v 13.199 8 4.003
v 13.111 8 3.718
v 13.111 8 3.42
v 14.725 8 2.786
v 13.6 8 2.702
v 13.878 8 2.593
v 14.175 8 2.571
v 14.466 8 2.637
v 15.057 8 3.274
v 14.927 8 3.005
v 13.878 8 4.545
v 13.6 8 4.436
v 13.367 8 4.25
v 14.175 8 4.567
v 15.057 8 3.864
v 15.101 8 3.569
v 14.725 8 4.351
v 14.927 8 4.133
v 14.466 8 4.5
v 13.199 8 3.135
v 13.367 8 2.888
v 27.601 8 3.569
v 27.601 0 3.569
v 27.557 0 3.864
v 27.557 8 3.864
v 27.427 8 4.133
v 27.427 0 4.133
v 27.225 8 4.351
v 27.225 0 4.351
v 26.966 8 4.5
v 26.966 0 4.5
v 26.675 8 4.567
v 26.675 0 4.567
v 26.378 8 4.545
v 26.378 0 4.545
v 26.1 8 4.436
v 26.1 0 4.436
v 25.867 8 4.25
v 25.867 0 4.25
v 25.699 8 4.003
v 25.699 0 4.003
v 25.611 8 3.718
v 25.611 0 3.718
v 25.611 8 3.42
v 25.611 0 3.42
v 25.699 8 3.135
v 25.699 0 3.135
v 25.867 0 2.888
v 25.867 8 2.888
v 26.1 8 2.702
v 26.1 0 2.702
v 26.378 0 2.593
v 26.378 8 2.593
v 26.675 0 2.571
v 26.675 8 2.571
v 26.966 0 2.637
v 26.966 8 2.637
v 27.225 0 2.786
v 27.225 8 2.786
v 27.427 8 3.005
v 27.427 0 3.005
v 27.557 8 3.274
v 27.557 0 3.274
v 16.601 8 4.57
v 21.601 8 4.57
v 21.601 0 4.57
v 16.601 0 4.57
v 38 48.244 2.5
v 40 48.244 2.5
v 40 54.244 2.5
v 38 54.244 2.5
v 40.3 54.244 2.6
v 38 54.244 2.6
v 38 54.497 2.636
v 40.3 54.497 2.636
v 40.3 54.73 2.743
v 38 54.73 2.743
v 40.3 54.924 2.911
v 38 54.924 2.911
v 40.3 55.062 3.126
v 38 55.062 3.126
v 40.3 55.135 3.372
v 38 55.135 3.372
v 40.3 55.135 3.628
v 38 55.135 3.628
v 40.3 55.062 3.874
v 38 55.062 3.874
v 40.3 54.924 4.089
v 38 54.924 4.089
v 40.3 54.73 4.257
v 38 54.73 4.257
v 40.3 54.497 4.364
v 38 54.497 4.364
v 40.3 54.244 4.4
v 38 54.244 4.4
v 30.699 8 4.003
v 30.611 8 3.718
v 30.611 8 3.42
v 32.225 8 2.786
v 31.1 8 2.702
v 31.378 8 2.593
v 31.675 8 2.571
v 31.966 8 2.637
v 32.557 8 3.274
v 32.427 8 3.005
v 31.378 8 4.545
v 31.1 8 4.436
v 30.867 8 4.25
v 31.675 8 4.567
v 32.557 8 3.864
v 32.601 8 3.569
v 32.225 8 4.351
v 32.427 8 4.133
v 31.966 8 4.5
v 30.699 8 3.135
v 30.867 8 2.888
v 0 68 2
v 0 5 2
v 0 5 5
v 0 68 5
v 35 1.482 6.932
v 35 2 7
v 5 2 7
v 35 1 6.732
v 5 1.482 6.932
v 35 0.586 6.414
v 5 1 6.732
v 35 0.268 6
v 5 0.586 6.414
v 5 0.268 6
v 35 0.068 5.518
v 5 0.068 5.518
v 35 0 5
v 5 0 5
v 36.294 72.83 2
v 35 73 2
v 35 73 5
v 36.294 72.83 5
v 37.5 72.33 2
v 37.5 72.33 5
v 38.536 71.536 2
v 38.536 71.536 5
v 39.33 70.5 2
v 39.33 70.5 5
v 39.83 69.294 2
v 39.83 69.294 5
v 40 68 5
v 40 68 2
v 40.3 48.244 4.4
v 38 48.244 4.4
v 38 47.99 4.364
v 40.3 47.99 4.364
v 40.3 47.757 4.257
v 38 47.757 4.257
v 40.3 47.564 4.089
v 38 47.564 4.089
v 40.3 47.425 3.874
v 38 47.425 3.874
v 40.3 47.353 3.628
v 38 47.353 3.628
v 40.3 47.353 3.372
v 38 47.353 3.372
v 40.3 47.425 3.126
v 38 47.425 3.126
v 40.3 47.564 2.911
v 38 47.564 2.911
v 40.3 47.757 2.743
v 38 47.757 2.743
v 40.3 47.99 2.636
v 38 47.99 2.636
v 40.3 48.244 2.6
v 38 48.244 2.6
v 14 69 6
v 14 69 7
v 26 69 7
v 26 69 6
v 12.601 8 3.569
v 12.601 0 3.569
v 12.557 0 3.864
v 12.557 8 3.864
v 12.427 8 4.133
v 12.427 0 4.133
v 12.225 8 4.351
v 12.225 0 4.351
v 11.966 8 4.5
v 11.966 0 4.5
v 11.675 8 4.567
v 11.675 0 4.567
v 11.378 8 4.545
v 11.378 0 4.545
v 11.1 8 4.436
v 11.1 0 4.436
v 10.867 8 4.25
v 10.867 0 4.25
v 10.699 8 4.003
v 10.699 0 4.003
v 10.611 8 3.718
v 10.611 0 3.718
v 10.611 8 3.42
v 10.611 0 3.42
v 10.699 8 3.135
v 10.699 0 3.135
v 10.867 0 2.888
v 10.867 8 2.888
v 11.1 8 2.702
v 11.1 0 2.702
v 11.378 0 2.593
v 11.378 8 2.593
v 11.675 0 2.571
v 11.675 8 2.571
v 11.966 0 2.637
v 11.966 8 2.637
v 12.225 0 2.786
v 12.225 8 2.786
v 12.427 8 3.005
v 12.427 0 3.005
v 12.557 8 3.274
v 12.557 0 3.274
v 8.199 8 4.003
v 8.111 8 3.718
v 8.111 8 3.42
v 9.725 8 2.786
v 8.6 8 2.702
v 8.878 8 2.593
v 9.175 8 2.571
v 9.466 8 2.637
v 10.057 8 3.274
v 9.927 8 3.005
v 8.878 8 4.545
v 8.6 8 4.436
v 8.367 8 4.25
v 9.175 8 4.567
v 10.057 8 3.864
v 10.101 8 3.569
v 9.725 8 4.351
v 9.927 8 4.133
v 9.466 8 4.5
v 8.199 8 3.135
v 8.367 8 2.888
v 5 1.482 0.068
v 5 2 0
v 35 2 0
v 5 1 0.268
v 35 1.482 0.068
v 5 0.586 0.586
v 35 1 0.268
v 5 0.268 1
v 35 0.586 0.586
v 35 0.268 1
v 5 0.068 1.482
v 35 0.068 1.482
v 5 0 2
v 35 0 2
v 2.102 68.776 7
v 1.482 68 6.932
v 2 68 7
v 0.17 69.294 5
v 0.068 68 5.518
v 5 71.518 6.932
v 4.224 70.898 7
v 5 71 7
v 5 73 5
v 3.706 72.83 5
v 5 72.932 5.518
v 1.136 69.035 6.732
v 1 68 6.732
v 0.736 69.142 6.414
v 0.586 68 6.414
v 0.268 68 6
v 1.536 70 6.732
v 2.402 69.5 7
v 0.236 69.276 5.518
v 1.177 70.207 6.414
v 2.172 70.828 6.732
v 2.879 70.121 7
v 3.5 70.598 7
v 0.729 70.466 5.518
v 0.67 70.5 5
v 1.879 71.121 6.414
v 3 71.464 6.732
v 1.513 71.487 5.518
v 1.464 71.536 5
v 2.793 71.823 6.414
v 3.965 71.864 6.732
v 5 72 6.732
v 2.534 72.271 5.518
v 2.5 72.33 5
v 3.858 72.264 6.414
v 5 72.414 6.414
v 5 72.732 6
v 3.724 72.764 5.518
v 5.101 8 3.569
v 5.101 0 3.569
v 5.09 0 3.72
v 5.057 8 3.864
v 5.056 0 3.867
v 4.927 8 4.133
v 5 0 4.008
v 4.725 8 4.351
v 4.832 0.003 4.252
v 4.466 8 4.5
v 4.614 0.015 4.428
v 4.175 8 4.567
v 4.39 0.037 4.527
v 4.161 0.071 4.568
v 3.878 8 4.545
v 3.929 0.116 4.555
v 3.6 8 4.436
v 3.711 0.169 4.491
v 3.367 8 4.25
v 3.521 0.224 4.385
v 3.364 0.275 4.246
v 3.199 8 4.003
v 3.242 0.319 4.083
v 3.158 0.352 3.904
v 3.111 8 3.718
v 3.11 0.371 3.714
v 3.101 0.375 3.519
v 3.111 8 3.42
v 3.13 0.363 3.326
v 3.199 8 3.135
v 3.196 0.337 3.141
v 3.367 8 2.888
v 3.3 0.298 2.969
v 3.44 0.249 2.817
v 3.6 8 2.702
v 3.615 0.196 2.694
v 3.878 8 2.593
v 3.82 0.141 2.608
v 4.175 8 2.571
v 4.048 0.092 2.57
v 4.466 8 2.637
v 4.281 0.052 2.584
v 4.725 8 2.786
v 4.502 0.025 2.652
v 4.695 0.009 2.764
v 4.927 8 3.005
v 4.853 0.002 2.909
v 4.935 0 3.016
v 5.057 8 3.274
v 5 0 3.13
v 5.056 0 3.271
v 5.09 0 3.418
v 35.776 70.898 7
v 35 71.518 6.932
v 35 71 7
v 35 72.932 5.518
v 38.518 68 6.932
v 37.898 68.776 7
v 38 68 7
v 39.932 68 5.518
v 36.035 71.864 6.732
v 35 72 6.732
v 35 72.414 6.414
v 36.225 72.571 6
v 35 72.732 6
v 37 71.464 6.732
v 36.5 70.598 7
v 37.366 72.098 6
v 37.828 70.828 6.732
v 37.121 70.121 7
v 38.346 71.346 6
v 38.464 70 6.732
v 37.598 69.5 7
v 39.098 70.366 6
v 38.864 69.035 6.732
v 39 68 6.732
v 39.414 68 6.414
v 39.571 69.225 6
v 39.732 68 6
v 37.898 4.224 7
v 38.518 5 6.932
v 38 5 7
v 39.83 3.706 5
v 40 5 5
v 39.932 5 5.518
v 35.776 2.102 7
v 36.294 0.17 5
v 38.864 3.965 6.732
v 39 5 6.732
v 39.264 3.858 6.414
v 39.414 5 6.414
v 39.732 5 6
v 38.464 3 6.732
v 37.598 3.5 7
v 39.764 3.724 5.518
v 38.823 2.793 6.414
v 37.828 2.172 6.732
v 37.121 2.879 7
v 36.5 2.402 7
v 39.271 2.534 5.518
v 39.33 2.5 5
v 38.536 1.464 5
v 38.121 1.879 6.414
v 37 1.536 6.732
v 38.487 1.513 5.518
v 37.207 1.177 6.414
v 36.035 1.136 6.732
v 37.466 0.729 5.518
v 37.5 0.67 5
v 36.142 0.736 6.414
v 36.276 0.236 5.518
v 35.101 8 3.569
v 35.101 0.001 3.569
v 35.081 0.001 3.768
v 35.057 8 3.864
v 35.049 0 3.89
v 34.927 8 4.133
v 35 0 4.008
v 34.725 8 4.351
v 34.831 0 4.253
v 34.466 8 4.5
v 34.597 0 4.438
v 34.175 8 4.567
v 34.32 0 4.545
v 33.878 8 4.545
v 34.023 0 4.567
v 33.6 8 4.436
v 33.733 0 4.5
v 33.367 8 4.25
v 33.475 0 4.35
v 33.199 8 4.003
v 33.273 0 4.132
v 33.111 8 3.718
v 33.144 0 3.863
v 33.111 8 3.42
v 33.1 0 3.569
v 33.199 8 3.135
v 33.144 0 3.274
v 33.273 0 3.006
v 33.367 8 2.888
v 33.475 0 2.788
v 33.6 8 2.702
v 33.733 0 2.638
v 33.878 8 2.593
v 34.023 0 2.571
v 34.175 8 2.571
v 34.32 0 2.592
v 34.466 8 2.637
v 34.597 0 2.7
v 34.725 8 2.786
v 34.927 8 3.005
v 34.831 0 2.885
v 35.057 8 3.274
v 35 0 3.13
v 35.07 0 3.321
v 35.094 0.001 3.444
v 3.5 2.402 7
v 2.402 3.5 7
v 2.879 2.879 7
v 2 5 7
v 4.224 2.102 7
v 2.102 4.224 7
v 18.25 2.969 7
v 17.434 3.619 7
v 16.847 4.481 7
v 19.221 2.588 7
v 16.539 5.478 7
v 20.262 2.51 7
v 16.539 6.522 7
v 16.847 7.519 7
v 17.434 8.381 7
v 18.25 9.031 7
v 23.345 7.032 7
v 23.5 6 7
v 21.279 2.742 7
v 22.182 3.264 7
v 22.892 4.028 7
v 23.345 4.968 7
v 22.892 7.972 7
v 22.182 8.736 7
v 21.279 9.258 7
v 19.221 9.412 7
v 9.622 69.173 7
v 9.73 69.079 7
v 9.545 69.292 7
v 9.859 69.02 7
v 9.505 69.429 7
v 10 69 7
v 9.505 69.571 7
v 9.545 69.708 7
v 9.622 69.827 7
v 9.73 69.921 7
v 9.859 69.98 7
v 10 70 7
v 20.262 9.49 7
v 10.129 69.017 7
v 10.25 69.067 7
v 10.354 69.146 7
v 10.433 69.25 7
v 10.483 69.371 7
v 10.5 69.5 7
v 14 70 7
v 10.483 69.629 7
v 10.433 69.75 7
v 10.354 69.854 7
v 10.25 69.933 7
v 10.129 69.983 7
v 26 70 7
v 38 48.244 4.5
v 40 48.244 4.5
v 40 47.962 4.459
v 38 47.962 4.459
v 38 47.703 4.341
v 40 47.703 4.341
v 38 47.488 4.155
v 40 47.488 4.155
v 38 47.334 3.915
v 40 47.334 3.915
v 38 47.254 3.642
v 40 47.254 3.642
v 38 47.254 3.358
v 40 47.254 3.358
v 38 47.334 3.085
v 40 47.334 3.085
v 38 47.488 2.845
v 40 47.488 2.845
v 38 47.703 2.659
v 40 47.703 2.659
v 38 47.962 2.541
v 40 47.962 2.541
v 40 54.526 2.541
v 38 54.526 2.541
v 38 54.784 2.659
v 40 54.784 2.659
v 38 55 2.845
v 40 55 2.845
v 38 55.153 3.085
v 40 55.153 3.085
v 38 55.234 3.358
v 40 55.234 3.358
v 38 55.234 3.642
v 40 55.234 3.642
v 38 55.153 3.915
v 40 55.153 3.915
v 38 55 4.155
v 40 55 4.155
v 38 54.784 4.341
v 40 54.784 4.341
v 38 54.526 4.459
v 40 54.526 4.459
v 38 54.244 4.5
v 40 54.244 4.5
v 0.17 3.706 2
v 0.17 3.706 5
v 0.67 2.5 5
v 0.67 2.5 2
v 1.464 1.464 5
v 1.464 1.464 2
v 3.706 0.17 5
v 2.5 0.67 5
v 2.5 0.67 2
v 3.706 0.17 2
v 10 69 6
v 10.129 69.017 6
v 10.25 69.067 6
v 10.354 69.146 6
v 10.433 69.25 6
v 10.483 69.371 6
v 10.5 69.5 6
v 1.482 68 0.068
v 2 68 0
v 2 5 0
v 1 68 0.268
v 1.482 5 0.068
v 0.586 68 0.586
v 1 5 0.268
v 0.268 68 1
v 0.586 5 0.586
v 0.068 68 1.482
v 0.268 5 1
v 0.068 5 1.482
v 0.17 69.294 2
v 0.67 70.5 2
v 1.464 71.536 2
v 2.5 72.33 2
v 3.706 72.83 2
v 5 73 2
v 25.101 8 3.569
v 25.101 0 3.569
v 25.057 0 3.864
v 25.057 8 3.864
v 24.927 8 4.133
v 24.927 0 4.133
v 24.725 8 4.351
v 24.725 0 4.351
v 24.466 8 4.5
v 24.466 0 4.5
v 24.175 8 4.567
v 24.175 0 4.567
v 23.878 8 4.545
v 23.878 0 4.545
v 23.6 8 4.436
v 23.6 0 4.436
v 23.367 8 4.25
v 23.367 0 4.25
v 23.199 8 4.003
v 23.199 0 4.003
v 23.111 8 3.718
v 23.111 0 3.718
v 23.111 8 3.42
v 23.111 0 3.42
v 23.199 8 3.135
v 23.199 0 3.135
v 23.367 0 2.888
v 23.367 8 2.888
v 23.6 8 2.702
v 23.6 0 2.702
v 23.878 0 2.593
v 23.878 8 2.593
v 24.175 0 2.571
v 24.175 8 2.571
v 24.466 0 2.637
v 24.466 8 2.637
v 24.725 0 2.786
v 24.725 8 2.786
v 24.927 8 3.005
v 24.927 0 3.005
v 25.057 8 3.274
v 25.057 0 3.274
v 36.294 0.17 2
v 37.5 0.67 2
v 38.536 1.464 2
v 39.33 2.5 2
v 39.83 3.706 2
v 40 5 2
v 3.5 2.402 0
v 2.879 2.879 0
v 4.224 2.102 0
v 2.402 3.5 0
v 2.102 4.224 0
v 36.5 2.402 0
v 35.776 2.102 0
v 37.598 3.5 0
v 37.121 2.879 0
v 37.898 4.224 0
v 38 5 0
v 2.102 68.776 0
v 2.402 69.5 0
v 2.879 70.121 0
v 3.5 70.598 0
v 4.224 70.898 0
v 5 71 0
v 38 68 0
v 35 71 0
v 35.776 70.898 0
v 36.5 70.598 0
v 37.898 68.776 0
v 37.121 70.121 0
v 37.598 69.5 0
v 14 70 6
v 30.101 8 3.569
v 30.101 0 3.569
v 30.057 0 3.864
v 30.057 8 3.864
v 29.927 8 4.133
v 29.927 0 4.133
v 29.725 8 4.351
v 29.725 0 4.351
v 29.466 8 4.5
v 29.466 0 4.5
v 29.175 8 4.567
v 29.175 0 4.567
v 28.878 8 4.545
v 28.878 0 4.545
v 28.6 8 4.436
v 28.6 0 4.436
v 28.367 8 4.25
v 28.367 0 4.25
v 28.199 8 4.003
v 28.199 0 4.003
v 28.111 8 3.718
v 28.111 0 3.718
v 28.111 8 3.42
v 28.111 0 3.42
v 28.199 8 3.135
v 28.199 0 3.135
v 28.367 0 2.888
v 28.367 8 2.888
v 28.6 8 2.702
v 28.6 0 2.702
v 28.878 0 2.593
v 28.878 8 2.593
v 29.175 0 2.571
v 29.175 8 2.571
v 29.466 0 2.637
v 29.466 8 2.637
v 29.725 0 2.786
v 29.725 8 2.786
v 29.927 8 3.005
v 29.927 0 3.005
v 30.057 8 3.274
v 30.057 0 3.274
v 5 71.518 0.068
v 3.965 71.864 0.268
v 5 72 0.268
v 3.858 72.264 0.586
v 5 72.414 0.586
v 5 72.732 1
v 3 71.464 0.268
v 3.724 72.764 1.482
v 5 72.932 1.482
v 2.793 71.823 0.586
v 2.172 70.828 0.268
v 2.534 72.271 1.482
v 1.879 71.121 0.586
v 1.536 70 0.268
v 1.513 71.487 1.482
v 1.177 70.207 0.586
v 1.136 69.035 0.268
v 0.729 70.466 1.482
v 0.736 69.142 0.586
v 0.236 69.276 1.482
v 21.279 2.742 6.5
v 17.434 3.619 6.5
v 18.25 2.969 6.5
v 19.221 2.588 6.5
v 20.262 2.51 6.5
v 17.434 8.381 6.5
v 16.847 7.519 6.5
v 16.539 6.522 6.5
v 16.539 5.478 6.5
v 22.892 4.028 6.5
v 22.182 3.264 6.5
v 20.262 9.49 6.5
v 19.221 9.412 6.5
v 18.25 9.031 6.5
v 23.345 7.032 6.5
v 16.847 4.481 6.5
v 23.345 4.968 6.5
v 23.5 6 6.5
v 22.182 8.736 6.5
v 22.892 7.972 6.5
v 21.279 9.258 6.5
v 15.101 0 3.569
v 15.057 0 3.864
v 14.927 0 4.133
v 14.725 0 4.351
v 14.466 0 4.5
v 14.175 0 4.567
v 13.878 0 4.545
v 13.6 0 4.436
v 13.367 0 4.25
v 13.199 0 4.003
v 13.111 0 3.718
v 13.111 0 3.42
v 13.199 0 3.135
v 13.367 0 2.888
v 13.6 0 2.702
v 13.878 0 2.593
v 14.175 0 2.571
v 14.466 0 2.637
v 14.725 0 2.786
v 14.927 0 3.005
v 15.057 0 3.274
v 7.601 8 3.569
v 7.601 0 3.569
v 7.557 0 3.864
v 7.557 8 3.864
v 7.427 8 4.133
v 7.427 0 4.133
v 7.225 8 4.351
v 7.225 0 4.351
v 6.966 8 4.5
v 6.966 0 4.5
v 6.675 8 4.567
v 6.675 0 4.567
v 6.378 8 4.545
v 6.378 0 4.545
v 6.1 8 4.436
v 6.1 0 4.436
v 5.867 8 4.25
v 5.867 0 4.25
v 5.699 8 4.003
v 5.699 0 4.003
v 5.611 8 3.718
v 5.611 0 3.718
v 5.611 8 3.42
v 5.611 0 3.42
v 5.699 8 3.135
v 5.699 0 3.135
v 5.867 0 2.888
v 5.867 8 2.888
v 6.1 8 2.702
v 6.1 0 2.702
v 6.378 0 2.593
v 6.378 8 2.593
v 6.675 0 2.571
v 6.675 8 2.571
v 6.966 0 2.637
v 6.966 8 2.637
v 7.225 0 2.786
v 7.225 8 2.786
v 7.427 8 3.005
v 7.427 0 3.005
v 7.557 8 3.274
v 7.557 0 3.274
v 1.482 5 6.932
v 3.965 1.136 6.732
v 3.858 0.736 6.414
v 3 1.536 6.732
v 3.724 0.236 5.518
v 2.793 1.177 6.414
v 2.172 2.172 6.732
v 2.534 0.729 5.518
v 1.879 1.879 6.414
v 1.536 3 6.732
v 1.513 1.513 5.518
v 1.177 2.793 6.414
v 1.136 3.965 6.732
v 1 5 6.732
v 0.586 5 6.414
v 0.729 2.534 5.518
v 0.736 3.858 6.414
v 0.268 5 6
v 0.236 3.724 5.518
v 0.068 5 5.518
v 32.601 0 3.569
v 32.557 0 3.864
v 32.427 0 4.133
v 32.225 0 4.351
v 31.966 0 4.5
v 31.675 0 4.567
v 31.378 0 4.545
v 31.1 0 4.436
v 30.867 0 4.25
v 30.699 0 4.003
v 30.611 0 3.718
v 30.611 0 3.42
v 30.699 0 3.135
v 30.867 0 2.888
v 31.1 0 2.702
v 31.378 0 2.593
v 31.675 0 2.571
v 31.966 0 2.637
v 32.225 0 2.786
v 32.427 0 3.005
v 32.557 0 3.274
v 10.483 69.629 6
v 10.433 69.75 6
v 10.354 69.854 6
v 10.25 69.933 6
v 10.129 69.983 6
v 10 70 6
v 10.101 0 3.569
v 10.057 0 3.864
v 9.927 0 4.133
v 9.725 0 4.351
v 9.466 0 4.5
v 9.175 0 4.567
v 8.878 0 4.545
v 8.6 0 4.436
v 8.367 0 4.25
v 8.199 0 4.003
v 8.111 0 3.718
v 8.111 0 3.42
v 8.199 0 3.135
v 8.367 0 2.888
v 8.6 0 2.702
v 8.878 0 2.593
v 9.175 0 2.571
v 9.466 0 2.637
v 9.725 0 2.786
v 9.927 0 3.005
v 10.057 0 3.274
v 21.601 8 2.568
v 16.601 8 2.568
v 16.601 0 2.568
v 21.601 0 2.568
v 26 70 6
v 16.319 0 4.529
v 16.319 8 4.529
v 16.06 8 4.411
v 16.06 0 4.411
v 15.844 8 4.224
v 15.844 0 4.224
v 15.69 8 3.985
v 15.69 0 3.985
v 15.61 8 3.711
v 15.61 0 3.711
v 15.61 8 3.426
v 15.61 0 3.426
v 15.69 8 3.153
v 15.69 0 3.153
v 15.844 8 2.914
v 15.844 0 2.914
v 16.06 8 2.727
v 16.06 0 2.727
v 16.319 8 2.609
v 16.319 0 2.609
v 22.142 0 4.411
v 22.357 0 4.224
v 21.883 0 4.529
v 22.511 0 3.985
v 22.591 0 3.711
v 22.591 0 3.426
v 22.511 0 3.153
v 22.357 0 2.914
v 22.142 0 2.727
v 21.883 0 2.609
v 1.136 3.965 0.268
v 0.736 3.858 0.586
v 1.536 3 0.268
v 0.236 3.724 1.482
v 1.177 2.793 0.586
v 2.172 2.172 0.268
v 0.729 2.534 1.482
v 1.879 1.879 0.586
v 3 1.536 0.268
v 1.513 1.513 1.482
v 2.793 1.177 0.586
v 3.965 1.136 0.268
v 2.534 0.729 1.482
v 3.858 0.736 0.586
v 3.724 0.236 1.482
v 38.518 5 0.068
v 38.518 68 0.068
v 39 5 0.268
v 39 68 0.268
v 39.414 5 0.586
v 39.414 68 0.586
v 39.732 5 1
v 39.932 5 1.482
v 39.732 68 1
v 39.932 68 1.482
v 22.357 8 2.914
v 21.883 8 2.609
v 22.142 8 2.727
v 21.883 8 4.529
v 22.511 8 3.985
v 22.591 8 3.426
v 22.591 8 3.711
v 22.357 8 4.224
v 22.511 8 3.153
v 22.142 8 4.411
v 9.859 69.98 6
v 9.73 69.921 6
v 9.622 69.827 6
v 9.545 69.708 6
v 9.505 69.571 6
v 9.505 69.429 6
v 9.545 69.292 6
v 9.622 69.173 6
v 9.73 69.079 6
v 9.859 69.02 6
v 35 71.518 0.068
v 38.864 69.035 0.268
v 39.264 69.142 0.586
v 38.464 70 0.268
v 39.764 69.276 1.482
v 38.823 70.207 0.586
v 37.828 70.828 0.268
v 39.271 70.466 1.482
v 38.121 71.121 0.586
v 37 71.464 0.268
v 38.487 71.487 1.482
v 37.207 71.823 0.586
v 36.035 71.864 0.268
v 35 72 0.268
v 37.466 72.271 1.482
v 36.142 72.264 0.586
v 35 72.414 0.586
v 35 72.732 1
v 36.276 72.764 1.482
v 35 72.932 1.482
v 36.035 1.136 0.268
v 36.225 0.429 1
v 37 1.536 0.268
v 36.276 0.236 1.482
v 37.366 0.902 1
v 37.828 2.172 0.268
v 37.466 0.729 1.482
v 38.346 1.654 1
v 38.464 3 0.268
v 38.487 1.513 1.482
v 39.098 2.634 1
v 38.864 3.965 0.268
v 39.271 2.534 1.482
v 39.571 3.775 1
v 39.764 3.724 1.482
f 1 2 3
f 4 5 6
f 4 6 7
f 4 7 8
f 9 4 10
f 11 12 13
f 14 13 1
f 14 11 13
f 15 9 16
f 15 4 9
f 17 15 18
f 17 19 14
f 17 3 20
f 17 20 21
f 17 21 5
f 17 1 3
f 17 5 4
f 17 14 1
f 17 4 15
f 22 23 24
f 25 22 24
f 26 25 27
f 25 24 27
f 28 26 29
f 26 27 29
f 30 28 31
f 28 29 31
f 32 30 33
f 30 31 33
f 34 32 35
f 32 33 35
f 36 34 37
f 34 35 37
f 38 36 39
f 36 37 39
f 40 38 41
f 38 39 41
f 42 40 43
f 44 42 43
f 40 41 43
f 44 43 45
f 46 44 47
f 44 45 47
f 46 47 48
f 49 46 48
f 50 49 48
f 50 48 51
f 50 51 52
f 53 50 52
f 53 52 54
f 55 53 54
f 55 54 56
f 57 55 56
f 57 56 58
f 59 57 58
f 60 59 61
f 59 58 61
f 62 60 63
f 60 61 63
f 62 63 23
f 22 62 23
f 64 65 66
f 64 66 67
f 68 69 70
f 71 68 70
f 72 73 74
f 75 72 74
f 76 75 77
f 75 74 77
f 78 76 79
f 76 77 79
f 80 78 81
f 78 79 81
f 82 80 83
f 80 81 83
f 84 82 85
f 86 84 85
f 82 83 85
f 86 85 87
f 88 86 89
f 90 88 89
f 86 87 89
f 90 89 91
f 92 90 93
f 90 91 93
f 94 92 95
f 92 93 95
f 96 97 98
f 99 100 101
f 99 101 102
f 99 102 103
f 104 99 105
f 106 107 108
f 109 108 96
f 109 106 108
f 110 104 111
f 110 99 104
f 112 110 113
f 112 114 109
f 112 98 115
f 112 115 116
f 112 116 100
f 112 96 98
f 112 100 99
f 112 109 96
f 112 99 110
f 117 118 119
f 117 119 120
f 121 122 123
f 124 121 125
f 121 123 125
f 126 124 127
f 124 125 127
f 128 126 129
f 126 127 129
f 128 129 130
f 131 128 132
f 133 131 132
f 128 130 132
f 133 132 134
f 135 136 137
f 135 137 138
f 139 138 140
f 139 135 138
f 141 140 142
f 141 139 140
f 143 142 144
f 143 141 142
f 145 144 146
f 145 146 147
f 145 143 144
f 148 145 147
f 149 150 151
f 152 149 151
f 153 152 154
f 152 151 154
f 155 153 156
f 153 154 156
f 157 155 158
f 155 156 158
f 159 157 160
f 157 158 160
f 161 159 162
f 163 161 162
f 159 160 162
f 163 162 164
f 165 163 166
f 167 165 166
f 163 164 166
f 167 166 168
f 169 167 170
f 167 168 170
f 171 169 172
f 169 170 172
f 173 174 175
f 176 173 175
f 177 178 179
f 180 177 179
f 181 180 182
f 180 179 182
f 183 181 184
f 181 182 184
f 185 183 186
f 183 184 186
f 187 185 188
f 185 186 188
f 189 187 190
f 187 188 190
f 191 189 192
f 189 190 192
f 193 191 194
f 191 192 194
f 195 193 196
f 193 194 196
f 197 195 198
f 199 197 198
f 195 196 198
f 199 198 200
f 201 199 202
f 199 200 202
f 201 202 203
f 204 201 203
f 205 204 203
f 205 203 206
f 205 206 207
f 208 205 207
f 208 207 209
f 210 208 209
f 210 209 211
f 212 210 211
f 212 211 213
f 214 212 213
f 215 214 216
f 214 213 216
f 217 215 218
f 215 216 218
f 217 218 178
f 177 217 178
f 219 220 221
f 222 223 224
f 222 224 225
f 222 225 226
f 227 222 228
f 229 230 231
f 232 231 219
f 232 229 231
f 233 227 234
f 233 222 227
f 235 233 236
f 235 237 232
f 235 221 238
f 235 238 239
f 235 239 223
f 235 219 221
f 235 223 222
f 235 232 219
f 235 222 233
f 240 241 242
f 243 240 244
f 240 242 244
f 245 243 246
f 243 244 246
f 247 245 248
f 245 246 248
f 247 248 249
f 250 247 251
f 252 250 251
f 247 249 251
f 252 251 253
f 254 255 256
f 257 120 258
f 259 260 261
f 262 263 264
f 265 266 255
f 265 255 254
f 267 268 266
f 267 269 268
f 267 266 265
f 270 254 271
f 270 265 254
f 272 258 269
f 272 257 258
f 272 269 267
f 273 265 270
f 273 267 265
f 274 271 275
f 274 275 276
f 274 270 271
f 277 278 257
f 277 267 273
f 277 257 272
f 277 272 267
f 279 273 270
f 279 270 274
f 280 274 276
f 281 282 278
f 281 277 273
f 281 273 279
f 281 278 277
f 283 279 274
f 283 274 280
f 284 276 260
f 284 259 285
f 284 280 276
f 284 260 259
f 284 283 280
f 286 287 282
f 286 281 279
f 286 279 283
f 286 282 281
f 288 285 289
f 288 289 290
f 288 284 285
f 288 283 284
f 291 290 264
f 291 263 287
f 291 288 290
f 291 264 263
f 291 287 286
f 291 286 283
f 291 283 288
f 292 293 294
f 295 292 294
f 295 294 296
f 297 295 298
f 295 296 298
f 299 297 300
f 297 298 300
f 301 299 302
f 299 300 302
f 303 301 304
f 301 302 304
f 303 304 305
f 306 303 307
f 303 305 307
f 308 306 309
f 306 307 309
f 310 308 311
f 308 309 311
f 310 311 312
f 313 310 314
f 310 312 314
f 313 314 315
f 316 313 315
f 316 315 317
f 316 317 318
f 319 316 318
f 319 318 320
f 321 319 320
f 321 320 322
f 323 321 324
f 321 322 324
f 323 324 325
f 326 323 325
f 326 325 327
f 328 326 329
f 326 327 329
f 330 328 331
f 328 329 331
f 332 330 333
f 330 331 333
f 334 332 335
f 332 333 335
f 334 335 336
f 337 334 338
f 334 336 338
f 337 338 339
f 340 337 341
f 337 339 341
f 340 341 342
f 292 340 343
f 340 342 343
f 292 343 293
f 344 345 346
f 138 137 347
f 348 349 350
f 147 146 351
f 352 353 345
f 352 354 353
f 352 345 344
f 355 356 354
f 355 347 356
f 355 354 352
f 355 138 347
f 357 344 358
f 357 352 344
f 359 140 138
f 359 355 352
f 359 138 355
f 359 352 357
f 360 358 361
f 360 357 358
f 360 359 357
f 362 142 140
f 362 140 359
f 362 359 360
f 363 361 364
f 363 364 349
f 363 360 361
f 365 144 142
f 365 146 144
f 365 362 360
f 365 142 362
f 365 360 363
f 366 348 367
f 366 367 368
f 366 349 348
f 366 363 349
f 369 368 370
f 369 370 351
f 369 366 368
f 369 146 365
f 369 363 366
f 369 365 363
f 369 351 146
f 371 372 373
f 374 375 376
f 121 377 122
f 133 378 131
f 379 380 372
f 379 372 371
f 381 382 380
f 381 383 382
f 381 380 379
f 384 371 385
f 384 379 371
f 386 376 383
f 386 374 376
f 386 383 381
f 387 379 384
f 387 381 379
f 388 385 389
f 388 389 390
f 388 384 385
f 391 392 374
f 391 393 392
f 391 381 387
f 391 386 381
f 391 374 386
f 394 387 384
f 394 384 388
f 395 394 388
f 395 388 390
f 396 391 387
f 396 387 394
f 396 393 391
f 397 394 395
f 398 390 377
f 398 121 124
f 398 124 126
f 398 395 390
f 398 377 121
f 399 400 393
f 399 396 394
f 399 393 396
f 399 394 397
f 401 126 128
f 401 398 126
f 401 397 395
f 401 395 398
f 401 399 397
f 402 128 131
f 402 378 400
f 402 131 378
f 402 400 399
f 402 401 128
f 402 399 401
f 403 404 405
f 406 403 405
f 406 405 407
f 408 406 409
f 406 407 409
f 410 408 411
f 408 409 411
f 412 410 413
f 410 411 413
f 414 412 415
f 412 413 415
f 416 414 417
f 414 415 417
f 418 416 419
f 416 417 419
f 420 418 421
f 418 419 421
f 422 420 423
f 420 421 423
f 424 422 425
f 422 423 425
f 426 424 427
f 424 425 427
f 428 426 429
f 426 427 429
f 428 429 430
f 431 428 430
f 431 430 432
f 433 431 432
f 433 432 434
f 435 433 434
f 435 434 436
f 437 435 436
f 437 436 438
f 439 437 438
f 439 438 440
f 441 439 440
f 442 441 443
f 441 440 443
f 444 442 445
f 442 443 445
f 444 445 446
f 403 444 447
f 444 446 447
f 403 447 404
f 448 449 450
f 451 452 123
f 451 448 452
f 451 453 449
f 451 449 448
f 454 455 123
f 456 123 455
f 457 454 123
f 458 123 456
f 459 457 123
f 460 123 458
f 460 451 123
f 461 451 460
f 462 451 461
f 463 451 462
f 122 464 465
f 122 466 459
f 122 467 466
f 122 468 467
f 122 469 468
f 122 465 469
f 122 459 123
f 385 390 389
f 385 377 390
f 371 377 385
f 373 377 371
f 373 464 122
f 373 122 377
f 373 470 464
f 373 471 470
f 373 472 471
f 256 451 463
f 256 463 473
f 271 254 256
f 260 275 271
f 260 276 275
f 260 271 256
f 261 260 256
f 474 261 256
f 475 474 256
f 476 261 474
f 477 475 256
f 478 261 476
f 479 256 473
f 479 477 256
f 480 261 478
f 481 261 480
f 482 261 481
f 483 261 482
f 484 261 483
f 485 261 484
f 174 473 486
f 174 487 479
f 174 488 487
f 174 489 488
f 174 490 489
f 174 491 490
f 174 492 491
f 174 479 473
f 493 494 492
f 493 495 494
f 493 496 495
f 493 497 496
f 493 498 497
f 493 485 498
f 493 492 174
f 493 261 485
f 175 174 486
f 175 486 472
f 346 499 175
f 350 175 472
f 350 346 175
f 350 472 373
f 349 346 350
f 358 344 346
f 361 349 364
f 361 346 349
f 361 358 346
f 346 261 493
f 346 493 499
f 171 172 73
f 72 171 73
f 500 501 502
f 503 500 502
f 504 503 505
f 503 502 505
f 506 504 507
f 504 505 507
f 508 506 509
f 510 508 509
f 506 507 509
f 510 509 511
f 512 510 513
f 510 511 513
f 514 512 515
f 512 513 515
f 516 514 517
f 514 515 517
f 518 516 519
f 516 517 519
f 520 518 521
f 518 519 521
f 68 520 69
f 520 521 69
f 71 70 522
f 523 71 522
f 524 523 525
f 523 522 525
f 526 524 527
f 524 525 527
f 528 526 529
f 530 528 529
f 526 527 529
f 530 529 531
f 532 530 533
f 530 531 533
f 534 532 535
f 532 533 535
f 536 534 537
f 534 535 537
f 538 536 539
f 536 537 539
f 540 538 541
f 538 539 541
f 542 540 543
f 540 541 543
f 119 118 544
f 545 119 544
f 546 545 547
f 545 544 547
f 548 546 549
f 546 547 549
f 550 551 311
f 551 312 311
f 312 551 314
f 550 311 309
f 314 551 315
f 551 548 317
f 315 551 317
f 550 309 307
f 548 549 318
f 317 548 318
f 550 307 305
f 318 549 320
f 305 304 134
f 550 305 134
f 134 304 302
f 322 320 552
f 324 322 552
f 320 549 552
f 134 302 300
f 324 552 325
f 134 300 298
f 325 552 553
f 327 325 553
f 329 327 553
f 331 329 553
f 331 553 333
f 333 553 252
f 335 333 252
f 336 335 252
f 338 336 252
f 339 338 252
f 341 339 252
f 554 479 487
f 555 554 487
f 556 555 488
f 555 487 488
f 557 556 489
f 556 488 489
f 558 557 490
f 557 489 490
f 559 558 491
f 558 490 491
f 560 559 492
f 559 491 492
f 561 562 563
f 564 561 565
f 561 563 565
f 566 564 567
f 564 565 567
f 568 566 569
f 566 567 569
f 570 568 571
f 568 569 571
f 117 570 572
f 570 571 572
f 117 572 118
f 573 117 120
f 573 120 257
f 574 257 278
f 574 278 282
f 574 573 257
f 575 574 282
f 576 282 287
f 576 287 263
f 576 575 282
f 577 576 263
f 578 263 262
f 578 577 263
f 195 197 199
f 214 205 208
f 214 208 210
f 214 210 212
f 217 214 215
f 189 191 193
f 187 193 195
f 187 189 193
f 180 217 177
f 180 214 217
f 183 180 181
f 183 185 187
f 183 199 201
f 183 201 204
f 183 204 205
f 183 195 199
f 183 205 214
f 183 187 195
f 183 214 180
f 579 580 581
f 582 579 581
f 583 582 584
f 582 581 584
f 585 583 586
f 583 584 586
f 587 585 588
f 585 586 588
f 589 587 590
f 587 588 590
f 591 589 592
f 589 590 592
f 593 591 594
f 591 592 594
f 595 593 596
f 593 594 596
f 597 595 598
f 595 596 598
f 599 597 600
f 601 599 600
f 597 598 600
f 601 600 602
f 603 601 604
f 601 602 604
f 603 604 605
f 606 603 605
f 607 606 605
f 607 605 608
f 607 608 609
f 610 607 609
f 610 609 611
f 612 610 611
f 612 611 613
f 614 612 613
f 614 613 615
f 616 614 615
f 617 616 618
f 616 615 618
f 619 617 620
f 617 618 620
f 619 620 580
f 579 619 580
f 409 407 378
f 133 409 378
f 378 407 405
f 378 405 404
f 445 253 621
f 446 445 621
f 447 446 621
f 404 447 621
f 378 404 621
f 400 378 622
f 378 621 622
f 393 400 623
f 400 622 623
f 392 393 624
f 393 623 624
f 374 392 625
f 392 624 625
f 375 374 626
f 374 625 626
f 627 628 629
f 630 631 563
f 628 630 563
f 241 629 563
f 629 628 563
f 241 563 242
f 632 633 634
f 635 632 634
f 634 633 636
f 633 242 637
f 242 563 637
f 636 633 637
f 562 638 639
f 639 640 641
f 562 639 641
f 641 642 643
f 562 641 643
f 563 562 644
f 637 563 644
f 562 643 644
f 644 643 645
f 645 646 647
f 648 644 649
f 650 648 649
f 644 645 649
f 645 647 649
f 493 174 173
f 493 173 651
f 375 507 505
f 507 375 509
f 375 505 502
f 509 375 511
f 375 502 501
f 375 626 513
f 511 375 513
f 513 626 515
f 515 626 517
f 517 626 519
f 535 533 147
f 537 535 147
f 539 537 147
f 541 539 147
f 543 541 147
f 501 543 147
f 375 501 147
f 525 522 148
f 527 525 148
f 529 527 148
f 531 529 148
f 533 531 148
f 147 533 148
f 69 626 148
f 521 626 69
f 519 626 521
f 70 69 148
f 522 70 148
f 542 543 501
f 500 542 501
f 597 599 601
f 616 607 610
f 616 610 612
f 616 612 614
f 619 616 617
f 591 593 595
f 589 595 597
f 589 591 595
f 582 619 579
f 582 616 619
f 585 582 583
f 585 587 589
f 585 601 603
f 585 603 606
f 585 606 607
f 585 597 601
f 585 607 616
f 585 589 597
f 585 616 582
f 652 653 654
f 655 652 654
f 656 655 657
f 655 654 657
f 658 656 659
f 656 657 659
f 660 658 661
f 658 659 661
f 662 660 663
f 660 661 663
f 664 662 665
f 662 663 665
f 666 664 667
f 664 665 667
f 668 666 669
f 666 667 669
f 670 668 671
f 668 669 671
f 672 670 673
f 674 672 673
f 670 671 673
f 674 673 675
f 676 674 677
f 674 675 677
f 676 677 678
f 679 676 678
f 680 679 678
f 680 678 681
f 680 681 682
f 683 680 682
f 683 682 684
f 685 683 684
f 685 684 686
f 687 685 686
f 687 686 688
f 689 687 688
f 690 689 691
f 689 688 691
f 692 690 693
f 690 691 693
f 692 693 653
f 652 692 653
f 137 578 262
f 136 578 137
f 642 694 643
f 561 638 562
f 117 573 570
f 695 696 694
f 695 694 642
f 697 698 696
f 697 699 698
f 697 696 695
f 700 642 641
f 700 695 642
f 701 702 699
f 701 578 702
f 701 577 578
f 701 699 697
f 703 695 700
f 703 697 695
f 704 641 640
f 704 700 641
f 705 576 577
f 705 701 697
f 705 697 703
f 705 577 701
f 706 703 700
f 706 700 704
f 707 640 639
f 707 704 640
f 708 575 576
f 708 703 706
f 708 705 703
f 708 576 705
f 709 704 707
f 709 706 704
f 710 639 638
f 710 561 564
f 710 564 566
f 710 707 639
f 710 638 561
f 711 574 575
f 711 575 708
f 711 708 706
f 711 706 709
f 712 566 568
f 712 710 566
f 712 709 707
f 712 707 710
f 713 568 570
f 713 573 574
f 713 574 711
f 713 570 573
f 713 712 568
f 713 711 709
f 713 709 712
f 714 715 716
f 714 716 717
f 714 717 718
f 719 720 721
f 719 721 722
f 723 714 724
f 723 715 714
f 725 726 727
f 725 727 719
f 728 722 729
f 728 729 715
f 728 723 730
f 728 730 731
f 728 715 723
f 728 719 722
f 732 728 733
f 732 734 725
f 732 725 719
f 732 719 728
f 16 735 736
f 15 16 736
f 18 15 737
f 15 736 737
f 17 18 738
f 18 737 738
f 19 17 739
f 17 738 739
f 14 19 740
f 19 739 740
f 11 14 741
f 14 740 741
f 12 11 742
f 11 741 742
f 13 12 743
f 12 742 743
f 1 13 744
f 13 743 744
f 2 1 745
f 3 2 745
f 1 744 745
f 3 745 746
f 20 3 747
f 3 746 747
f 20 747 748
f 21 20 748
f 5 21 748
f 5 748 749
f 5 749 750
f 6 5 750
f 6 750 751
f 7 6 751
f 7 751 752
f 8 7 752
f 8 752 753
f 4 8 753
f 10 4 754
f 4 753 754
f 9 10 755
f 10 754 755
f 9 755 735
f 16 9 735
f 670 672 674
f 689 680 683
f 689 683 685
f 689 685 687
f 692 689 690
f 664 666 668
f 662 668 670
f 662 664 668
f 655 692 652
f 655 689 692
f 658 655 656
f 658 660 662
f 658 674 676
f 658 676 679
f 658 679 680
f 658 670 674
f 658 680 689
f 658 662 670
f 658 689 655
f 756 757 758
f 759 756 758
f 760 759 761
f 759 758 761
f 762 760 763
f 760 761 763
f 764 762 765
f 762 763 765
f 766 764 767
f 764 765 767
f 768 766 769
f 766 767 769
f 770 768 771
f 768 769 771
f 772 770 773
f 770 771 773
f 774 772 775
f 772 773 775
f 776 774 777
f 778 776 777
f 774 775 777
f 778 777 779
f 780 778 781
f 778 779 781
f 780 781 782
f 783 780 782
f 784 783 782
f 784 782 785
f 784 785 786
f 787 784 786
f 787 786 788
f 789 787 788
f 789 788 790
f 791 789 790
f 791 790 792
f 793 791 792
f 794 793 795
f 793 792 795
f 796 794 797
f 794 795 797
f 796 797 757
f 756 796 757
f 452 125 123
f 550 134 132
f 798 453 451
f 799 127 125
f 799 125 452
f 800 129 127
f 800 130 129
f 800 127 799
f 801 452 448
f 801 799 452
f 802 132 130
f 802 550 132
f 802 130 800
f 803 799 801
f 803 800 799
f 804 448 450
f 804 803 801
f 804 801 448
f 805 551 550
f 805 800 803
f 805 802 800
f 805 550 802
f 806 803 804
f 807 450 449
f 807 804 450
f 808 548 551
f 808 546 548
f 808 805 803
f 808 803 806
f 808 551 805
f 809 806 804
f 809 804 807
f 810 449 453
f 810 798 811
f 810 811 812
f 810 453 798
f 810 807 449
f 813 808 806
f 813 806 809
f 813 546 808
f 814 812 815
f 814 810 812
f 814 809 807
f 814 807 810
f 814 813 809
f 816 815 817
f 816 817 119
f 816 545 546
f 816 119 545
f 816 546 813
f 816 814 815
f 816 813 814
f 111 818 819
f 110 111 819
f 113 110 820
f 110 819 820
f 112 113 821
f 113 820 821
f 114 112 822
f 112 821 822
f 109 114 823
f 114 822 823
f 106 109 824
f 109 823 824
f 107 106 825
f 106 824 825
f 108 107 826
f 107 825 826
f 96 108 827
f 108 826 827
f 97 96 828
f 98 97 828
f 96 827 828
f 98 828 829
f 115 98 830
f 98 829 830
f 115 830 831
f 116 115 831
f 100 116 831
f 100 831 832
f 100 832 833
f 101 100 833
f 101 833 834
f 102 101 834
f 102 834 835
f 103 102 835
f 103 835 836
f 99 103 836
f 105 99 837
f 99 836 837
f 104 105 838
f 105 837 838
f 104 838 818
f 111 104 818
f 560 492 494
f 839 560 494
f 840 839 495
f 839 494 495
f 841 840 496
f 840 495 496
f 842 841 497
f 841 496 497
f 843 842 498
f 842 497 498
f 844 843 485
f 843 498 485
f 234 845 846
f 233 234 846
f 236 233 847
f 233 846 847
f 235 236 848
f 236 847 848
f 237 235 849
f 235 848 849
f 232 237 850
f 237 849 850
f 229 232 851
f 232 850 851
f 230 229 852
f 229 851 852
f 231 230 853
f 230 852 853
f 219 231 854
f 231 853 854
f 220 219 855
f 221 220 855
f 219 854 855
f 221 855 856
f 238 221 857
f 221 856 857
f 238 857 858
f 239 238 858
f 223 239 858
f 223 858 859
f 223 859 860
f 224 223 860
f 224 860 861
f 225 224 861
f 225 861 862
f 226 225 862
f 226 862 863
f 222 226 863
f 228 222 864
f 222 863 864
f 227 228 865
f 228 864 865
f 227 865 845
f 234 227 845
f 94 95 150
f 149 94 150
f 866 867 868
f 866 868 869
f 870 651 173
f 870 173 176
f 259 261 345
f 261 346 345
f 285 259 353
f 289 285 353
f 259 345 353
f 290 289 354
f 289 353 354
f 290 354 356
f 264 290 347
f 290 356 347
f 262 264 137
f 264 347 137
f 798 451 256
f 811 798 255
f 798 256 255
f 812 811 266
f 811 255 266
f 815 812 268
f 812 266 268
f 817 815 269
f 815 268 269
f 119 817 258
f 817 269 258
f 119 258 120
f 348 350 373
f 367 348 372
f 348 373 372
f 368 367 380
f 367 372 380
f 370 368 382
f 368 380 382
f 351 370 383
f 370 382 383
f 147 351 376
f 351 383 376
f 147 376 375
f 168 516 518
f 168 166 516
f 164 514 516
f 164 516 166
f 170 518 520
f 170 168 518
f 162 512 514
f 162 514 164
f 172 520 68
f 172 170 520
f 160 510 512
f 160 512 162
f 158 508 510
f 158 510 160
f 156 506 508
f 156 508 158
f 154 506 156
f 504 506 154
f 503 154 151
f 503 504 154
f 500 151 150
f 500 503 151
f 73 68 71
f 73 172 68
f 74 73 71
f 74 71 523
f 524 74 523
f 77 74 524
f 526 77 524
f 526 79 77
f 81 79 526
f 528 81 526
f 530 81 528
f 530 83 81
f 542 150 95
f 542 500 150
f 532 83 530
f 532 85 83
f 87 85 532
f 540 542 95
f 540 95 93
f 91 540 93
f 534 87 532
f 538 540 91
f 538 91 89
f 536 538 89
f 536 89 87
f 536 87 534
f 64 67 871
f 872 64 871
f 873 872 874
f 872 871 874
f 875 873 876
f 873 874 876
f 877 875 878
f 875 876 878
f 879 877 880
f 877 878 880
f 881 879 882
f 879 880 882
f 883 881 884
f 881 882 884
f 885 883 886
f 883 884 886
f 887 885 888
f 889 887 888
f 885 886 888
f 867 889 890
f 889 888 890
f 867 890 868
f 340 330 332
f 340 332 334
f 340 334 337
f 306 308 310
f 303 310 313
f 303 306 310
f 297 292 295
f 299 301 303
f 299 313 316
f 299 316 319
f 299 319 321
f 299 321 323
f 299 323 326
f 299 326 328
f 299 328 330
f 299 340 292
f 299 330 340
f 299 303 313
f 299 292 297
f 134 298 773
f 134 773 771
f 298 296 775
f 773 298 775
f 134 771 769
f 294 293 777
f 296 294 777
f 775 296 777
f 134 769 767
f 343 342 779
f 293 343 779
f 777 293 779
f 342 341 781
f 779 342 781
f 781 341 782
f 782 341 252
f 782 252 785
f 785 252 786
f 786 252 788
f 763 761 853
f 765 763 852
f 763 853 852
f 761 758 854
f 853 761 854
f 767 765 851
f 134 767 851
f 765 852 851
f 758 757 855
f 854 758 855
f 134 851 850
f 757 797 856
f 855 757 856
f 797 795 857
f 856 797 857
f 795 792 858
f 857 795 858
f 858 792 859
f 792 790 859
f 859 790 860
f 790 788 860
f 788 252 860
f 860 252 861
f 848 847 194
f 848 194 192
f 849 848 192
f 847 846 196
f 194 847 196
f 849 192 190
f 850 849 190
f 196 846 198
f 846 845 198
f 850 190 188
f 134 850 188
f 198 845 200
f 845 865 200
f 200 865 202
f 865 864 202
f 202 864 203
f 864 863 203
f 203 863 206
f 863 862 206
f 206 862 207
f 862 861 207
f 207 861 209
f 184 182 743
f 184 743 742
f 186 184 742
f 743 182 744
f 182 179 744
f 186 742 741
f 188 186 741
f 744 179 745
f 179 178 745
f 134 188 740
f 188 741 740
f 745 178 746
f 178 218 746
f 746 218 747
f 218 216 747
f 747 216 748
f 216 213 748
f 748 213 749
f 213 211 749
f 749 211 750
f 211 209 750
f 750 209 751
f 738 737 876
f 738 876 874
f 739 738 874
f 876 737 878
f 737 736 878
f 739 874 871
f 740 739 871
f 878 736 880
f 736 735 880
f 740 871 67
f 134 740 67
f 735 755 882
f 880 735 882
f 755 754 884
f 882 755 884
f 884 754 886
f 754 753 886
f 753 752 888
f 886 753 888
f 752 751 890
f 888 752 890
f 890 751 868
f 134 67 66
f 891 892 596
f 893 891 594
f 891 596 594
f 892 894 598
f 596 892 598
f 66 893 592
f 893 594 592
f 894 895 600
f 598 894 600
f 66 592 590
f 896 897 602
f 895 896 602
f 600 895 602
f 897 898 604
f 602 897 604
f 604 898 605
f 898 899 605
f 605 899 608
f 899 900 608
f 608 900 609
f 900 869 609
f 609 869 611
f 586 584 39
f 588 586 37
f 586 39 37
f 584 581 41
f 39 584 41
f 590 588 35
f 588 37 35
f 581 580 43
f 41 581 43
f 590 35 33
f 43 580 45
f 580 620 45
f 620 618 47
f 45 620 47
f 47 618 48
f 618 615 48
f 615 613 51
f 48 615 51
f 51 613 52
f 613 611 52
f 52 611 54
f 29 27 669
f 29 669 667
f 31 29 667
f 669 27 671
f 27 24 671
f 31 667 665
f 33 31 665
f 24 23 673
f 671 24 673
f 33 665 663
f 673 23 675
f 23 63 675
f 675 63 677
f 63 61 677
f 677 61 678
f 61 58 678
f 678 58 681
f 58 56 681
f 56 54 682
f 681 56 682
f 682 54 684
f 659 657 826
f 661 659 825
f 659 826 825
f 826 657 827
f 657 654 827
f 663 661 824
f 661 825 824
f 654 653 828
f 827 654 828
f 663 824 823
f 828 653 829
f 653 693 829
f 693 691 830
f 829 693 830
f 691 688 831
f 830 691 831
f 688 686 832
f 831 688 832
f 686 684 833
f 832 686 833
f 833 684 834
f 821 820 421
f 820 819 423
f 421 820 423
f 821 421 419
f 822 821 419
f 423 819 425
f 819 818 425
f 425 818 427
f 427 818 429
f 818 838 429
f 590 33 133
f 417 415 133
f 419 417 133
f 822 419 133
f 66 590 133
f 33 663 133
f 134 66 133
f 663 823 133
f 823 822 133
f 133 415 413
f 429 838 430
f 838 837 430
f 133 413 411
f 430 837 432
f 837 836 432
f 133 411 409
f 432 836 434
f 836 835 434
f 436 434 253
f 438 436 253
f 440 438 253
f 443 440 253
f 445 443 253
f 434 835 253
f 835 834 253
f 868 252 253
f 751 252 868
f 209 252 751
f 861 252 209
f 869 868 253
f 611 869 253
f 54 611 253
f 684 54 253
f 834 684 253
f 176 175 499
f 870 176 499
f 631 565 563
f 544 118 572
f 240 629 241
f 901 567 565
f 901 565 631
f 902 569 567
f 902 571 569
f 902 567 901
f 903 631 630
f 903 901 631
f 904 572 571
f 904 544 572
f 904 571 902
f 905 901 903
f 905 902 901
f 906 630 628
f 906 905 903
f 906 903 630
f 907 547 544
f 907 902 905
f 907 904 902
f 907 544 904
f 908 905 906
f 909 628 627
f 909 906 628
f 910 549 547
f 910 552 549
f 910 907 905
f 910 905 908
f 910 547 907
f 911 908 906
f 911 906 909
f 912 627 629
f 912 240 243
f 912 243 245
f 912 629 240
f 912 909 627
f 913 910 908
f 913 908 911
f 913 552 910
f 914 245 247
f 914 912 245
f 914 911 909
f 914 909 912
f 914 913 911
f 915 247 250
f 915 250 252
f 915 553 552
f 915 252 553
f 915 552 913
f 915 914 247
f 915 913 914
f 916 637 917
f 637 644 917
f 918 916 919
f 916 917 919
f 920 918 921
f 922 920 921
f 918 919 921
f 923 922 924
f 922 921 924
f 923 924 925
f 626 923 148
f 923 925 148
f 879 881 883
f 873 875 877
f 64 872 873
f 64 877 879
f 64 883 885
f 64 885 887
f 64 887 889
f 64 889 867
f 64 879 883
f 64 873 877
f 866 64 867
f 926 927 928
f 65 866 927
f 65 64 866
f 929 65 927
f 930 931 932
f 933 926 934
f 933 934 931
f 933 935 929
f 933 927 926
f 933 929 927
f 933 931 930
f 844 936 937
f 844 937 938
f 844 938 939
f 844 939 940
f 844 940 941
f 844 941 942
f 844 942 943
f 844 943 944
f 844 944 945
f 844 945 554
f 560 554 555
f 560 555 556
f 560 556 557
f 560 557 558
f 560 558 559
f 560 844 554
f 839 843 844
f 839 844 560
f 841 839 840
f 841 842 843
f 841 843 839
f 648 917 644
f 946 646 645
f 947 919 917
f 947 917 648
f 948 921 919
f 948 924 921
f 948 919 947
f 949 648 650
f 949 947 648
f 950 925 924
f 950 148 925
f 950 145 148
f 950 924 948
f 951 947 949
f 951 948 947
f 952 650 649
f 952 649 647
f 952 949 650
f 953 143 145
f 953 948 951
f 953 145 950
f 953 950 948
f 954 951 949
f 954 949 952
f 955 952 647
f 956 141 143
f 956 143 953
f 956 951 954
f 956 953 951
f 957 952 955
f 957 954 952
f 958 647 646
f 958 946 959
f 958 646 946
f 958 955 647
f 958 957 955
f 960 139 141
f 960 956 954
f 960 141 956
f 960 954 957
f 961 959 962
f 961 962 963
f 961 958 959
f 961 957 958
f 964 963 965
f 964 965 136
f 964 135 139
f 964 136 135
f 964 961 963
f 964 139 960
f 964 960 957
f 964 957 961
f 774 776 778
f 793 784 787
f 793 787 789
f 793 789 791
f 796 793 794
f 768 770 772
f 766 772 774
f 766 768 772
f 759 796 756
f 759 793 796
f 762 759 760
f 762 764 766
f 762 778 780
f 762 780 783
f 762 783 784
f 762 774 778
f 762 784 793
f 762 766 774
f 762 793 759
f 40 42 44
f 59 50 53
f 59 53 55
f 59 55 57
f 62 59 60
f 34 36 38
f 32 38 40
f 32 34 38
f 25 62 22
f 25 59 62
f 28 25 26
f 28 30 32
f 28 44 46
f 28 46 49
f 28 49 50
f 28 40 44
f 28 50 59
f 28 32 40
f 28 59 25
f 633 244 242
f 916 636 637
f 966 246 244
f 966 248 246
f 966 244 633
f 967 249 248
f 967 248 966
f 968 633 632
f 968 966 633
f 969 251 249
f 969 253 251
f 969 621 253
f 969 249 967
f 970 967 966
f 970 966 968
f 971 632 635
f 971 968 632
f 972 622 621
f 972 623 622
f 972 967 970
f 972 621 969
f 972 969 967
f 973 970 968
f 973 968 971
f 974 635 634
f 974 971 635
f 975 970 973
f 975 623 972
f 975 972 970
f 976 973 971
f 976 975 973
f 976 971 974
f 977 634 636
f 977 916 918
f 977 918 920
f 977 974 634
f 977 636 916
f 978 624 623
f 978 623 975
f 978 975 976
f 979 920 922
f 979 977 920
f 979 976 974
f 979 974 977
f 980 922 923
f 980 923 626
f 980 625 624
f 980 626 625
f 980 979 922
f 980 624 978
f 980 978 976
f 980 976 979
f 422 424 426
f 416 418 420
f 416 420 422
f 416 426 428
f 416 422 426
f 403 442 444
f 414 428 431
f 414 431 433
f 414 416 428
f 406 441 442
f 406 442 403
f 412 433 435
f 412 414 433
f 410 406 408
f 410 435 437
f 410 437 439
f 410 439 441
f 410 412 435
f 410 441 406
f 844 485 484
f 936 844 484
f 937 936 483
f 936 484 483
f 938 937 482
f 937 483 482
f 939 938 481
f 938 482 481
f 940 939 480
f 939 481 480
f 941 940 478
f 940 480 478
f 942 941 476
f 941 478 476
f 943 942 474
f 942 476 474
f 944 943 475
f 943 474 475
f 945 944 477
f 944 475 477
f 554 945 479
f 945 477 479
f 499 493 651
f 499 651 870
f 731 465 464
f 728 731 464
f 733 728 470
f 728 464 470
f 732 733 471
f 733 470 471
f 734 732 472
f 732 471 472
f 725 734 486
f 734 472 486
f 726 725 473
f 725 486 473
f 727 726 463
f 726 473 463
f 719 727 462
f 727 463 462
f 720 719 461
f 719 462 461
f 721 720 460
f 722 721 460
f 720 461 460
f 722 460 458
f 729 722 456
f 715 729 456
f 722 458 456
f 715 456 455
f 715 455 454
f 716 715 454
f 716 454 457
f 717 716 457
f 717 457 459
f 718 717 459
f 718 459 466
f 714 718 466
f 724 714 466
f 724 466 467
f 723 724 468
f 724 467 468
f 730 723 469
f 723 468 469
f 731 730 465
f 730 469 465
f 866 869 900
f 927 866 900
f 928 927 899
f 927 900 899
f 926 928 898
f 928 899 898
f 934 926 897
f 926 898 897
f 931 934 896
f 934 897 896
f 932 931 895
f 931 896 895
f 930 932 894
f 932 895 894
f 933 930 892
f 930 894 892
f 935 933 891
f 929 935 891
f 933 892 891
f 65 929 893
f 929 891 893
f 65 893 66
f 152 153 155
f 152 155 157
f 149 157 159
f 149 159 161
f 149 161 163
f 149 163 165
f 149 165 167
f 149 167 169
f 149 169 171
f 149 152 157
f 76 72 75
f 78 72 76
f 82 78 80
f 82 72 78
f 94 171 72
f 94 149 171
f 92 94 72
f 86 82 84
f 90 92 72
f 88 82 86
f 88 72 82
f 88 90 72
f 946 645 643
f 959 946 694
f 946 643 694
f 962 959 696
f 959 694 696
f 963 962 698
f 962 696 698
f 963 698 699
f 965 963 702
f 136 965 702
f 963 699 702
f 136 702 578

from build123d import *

# Parameters (mm, degrees)
F0_W         = 40
F0_H         = 73
F1_DEPTH     = 7
F3_R         = 1.0007571232
F4_DEPTH     = 8
F6_DEPTH     = 2
F8_DEPTH     = 2.3
F9_R         = 3.5
F10_DEPTH    = 0.5
F11_W        = 12
F11_H        = 1
F12_DEPTH    = 1
F13_T1_DEPTH = 32
F14_R        = 2
F15_R        = 2


# Not quite as in the source:
# - a fillet or chamfer that OpenCascade refuses, or shapes differently, is made with other operations: its cross-section is extruded or revolved along the edge and cut away or added


with BuildPart() as f1:
    # F0 (on Top) → F1 (new body)
    with BuildSketch(Plane.XY):
        with Locations((20, 36.5)):
            Rectangle(F0_W, F0_H)
    extrude(amount=F1_DEPTH)

    # F3 (on face) → F4 (cut)
    with BuildSketch(Plane.XZ):
        with Locations((4.10061609, 3.5689128563)):
            Circle(F3_R)
        with Locations((6.60061609, 3.5689128563)):
            Circle(F3_R)
        with Locations((9.10061609, 3.5689128563)):
            Circle(F3_R)
        with Locations((11.60061609, 3.5689128563)):
            Circle(F3_R)
        with Locations((14.10061609, 3.5689128563)):
            Circle(F3_R)
        with BuildLine():
            Line((21.60061609, 4.5696699795), (16.60061609, 4.5696699795))
            ThreePointArc((16.60061609, 4.5696699795), (15.5998589668, 3.5689128563), (16.60061609, 2.568155733))
            Line((16.60061609, 2.568155733), (21.60061609, 2.568155733))
            ThreePointArc((21.60061609, 2.568155733), (22.6013732132, 3.5689128563), (21.60061609, 4.5696699795))
        make_face()
        with Locations((24.10061609, 3.5689128563)):
            Circle(F3_R)
        with Locations((26.60061609, 3.5689128563)):
            Circle(F3_R)
        with Locations((29.10061609, 3.5689128563)):
            Circle(F3_R)
        with Locations((31.60061609, 3.5689128563)):
            Circle(F3_R)
        with Locations((34.10061609, 3.5689128563)):
            Circle(F3_R)
    extrude(amount=-F4_DEPTH, mode=Mode.SUBTRACT)

    # F5 (on face) → F6 (cut)
    with BuildSketch(Plane.YZ.offset(40)):
        with BuildLine():
            Line((54.2437834144, 4.5), (48.2437834144, 4.5))
            ThreePointArc((48.2437834144, 4.5), (47.2437834144, 3.5), (48.2437834144, 2.5))
            Line((48.2437834144, 2.5), (54.2437834144, 2.5))
            ThreePointArc((54.2437834144, 2.5), (55.2437834144, 3.5), (54.2437834144, 4.5))
        make_face()
    extrude(amount=-F6_DEPTH, mode=Mode.SUBTRACT)

    # F7 (on face) → F8 (join)
    with BuildSketch(Plane.YZ.offset(38)):
        with BuildLine():
            Line((54.2437834144, 4.4), (48.2437834144, 4.4))
            ThreePointArc((48.2437834144, 4.4), (47.3437834144, 3.5), (48.2437834144, 2.6))
            Line((48.2437834144, 2.6), (54.2437834144, 2.6))
            ThreePointArc((54.2437834144, 2.6), (55.1437834144, 3.5), (54.2437834144, 4.4))
        make_face()
    extrude(amount=F8_DEPTH)

    # F9 (on face) → F10 (cut)
    with BuildSketch(Plane.XY.offset(7)):
        with Locations((20, 6)):
            Circle(F9_R)
    extrude(amount=-F10_DEPTH, mode=Mode.SUBTRACT)

    # F11 (on face) → F12 (cut)
    with BuildSketch(Plane.XY.offset(7)):
        with Locations((20, 69.5)):
            Rectangle(F11_W, F11_H)
        with BuildLine():
            ThreePointArc((10.5, 69.5), (10.3535533906, 69.8535533906), (10, 70))
            Line((10, 70), (10, 69))
            ThreePointArc((10, 69), (10.3535533906, 69.1464466094), (10.5, 69.5))
        make_face()
        with BuildLine():
            Line((10, 69), (10, 70))
            ThreePointArc((10, 70), (9.5, 69.5), (10, 69))
        make_face()
    extrude(amount=-F12_DEPTH, mode=Mode.SUBTRACT)

    # F13: fillet of radius 5 on 4 edges, made by hand

    # F13_s2 → F13_t1 (cut)
    with BuildSketch(Plane.XY.offset(-12.5)):
        with BuildLine():
            ThreePointArc((35, 0), (38.5355339059, 1.4644660941), (40, 5))
            Line((40, 5), (40, 0))
            Line((40, 0), (35, 0))
        make_face()
        with BuildLine():
            ThreePointArc((0, 5), (1.4644660941, 1.4644660941), (5, 0))
            Line((5, 0), (0, 0))
            Line((0, 0), (0, 5))
        make_face()
        with BuildLine():
            ThreePointArc((35, 73), (38.5355339059, 71.5355339059), (40, 68))
            Line((40, 68), (40, 73))
            Line((40, 73), (35, 73))
        make_face()
        with BuildLine():
            ThreePointArc((0, 68), (1.4644660941, 71.5355339059), (5, 73))
            Line((5, 73), (0, 73))
            Line((0, 73), (0, 68))
        make_face()
    extrude(amount=F13_T1_DEPTH, mode=Mode.SUBTRACT)

    # F14
    f14_edges = [f1.edges().sort_by_distance(p)[0] for p in [
        (38.535534, 71.535534, 7),
        (20, 73, 7),
        (1.464466, 71.535534, 7),
        (0, 36.5, 7),
        (1.464466, 1.464466, 7),
        (20, 0, 7),
        (38.535534, 1.464466, 7),
        (40, 36.5, 7),
    ]]
    fillet(f14_edges, radius=F14_R)

    # F15
    f15_edges = [f1.edges().sort_by_distance(p)[0] for p in [
        (40, 36.5, 0),
        (38.535534, 71.535534, 0),
        (20, 73, 0),
        (1.464466, 71.535534, 0),
        (0, 36.5, 0),
        (38.535534, 1.464466, 0),
        (20, 0, 0),
        (1.464466, 1.464466, 0),
    ]]
    fillet(f15_edges, radius=F15_R)


solid = f1.part
